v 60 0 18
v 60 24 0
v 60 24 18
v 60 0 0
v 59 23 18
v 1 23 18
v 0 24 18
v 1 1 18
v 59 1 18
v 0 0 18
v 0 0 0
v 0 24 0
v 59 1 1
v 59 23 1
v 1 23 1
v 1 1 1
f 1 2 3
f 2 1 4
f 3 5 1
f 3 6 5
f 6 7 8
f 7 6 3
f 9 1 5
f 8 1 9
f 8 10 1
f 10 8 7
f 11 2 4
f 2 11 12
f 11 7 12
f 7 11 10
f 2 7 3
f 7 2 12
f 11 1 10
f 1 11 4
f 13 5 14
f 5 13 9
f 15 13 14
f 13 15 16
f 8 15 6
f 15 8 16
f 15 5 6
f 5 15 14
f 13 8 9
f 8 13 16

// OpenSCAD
// Keukeneiland - holle balk, open bovenzijde
// Afmetingen: 60mm x 24mm x 18mm, wanddikte 1mm

length = 60;
width  = 24;
height = 18;
wall   = 1;

module keukeneiland() {
    difference() {
        // Buitenkant
        cube([length, width, height]);

        // Binnenkant (open naar boven: begint op wall-hoogte, reikt tot boven)
        translate([wall, wall, wall])
            cube([length - 2*wall, width - 2*wall, height]);
    }
}

keukeneiland();
